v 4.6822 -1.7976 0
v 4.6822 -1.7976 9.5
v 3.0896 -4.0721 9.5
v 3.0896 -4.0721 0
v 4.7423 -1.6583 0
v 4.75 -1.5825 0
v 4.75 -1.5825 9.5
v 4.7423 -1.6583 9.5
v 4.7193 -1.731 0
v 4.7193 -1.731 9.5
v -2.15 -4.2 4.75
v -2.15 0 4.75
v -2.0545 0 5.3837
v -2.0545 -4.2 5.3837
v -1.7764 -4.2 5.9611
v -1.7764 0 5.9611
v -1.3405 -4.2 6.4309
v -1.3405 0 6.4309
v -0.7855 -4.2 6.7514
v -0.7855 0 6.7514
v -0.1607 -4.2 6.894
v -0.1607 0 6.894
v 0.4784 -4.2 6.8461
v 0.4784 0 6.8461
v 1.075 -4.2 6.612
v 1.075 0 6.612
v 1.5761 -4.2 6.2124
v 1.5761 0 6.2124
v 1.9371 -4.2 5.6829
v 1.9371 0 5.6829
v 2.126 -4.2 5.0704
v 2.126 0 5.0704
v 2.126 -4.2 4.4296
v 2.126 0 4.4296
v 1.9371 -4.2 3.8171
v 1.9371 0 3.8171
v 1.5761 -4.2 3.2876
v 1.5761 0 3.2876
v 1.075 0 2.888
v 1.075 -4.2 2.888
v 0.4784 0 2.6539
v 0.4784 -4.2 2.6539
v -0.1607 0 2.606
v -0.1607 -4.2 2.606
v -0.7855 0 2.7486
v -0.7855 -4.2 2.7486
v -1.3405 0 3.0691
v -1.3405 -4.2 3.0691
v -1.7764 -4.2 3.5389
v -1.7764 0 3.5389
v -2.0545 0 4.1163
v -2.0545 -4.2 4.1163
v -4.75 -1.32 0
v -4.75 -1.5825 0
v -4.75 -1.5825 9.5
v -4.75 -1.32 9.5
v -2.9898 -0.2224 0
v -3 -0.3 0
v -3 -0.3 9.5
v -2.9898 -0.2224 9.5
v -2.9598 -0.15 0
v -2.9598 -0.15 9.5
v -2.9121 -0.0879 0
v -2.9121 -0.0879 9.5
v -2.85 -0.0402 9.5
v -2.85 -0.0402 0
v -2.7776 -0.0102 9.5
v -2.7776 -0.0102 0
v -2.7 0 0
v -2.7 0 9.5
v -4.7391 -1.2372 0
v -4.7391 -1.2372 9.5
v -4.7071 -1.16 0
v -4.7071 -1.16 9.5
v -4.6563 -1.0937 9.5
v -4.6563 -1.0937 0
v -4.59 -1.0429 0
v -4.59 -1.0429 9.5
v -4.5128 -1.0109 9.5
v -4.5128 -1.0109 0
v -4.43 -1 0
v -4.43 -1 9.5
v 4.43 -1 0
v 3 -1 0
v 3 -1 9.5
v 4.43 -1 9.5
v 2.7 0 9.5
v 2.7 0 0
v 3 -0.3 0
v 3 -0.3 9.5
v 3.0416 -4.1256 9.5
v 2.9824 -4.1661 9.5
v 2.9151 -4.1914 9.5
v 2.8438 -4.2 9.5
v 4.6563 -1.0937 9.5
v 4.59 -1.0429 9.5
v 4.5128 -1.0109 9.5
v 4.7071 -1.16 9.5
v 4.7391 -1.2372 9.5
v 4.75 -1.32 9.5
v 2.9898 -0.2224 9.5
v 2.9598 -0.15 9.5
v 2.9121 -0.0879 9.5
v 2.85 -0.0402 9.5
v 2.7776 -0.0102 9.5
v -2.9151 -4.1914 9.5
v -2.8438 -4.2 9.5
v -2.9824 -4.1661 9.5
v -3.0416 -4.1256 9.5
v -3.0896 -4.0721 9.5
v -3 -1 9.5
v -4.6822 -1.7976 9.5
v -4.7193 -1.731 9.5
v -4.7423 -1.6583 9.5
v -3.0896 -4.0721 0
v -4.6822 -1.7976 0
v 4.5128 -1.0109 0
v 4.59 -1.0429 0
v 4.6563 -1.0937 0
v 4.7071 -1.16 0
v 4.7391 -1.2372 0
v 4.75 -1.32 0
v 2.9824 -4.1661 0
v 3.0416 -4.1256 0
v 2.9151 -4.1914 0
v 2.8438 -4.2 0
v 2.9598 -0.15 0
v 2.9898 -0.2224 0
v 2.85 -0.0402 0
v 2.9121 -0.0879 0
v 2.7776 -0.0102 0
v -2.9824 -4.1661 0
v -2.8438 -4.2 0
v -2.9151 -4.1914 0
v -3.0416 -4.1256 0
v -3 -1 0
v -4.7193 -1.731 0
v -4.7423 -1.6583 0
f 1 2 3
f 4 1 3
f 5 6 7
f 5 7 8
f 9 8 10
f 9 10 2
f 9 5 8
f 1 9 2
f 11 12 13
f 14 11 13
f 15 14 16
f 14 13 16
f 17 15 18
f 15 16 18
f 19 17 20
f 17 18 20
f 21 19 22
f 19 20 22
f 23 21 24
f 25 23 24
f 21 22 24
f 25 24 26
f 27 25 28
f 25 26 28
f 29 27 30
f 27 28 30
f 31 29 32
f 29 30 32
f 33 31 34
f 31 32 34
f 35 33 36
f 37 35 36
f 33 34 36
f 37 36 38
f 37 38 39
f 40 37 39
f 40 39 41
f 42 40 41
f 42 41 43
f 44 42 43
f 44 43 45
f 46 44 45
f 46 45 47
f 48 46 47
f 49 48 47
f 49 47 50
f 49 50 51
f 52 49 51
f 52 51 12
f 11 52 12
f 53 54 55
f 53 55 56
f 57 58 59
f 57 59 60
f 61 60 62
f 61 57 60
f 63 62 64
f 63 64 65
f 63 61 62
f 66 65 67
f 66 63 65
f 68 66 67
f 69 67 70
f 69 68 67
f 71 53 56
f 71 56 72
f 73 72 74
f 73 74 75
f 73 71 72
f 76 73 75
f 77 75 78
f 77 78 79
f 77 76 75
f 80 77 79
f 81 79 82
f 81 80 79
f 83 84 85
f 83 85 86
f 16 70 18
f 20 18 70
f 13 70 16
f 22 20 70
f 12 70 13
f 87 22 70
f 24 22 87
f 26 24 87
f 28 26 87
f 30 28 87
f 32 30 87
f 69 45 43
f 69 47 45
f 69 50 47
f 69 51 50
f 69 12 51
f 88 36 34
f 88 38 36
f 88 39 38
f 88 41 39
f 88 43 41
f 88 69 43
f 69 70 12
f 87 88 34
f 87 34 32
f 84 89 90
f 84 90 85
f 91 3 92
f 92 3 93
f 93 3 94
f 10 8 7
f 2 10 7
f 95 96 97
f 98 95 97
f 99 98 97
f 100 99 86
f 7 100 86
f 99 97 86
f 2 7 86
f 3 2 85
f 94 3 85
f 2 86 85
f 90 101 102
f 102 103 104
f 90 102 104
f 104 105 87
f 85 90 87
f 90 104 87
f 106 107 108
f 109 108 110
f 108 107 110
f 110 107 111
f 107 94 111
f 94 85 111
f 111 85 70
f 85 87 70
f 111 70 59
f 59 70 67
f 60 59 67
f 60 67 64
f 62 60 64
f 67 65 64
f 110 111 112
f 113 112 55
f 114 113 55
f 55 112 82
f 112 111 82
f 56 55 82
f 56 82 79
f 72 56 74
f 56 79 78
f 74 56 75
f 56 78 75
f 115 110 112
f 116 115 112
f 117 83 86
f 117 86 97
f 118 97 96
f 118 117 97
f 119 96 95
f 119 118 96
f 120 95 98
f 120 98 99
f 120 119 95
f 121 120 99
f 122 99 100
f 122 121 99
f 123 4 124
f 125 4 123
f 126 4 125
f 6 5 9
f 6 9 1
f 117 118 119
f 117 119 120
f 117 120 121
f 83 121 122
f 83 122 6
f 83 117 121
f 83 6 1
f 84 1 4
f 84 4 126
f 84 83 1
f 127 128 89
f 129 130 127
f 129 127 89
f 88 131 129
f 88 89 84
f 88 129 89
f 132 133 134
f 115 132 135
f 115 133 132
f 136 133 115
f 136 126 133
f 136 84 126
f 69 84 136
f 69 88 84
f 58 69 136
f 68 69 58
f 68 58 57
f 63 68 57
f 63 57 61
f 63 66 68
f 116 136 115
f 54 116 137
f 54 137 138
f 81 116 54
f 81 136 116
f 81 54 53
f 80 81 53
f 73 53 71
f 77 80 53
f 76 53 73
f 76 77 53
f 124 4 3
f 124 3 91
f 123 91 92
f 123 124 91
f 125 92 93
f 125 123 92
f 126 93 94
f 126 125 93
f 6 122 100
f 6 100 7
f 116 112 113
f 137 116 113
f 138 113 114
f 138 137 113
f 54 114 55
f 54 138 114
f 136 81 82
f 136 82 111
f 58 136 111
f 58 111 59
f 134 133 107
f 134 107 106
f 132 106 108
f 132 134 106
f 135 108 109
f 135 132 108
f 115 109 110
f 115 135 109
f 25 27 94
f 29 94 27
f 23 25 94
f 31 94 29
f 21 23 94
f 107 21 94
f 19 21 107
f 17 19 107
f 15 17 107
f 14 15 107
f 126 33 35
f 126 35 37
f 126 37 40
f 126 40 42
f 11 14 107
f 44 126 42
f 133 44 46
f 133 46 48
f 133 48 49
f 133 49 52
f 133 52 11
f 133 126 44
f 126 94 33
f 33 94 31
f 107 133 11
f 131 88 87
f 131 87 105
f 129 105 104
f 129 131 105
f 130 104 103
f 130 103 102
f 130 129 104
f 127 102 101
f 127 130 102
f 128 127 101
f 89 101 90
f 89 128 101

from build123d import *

# Parameters (mm, degrees)
EXTRUDE_2_DEPTH     = 9.5
CUT_EXTRUDE_2_REACH = 13.422
SKETCH_4_R          = 2.15


with BuildPart() as part:
    # 草图3 → 凸台-拉伸2 (new body)
    with BuildSketch(Plane.XY):
        with BuildLine():
            Line((-2.7, 0), (2.7, 0))
            ThreePointArc((2.7, 0), (2.912132034, -0.087867966), (3, -0.3))
            Line((3, -0.3), (3, -1))
            Line((3, -1), (4.43, -1))
            ThreePointArc((4.43, -1), (4.65627417, -1.09372583), (4.75, -1.32))
            Line((4.75, -1.32), (4.75, -1.582503942))
            ThreePointArc((4.75, -1.582503942), (4.732643857, -1.695268617), (4.682182017, -1.797595106))
            Line((4.682182017, -1.797595106), (3.089575498, -4.072072931))
            ThreePointArc((3.089575498, -4.072072931), (2.982354469, -4.16610325), (2.843829885, -4.2))
            Line((2.843829885, -4.2), (-2.843829885, -4.2))
            ThreePointArc((-2.843829885, -4.2), (-2.982354469, -4.16610325), (-3.089575498, -4.072072931))
            Line((-3.089575498, -4.072072931), (-4.682182017, -1.797595106))
            ThreePointArc((-4.682182017, -1.797595106), (-4.732643857, -1.695268617), (-4.75, -1.582503942))
            Line((-4.75, -1.582503942), (-4.75, -1.32))
            ThreePointArc((-4.75, -1.32), (-4.65627417, -1.09372583), (-4.43, -1))
            Line((-4.43, -1), (-3, -1))
            Line((-3, -1), (-3, -0.3))
            ThreePointArc((-3, -0.3), (-2.912132034, -0.087867966), (-2.7, 0))
        make_face()
    extrude(amount=EXTRUDE_2_DEPTH)

    # 草图4 → 切除-拉伸2 (cut, up to next)
    with BuildSketch(Plane(origin=(0, 0, 0), x_dir=(1, 0, 0), z_dir=(0, 1, 0)), mode=Mode.PRIVATE) as cut_extrude_2_sk1:
        with Locations(Location((0, -4.75, 0), (0, 0, 180))):
            Circle(SKETCH_4_R)
    cut_extrude_2_tool1 = extrude(cut_extrude_2_sk1.sketch, amount=-CUT_EXTRUDE_2_REACH, mode=Mode.PRIVATE) & part.part
    add(cut_extrude_2_tool1.solids().sort_by_distance((0, 0, 4.75))[0], mode=Mode.SUBTRACT)


solid = part.part
